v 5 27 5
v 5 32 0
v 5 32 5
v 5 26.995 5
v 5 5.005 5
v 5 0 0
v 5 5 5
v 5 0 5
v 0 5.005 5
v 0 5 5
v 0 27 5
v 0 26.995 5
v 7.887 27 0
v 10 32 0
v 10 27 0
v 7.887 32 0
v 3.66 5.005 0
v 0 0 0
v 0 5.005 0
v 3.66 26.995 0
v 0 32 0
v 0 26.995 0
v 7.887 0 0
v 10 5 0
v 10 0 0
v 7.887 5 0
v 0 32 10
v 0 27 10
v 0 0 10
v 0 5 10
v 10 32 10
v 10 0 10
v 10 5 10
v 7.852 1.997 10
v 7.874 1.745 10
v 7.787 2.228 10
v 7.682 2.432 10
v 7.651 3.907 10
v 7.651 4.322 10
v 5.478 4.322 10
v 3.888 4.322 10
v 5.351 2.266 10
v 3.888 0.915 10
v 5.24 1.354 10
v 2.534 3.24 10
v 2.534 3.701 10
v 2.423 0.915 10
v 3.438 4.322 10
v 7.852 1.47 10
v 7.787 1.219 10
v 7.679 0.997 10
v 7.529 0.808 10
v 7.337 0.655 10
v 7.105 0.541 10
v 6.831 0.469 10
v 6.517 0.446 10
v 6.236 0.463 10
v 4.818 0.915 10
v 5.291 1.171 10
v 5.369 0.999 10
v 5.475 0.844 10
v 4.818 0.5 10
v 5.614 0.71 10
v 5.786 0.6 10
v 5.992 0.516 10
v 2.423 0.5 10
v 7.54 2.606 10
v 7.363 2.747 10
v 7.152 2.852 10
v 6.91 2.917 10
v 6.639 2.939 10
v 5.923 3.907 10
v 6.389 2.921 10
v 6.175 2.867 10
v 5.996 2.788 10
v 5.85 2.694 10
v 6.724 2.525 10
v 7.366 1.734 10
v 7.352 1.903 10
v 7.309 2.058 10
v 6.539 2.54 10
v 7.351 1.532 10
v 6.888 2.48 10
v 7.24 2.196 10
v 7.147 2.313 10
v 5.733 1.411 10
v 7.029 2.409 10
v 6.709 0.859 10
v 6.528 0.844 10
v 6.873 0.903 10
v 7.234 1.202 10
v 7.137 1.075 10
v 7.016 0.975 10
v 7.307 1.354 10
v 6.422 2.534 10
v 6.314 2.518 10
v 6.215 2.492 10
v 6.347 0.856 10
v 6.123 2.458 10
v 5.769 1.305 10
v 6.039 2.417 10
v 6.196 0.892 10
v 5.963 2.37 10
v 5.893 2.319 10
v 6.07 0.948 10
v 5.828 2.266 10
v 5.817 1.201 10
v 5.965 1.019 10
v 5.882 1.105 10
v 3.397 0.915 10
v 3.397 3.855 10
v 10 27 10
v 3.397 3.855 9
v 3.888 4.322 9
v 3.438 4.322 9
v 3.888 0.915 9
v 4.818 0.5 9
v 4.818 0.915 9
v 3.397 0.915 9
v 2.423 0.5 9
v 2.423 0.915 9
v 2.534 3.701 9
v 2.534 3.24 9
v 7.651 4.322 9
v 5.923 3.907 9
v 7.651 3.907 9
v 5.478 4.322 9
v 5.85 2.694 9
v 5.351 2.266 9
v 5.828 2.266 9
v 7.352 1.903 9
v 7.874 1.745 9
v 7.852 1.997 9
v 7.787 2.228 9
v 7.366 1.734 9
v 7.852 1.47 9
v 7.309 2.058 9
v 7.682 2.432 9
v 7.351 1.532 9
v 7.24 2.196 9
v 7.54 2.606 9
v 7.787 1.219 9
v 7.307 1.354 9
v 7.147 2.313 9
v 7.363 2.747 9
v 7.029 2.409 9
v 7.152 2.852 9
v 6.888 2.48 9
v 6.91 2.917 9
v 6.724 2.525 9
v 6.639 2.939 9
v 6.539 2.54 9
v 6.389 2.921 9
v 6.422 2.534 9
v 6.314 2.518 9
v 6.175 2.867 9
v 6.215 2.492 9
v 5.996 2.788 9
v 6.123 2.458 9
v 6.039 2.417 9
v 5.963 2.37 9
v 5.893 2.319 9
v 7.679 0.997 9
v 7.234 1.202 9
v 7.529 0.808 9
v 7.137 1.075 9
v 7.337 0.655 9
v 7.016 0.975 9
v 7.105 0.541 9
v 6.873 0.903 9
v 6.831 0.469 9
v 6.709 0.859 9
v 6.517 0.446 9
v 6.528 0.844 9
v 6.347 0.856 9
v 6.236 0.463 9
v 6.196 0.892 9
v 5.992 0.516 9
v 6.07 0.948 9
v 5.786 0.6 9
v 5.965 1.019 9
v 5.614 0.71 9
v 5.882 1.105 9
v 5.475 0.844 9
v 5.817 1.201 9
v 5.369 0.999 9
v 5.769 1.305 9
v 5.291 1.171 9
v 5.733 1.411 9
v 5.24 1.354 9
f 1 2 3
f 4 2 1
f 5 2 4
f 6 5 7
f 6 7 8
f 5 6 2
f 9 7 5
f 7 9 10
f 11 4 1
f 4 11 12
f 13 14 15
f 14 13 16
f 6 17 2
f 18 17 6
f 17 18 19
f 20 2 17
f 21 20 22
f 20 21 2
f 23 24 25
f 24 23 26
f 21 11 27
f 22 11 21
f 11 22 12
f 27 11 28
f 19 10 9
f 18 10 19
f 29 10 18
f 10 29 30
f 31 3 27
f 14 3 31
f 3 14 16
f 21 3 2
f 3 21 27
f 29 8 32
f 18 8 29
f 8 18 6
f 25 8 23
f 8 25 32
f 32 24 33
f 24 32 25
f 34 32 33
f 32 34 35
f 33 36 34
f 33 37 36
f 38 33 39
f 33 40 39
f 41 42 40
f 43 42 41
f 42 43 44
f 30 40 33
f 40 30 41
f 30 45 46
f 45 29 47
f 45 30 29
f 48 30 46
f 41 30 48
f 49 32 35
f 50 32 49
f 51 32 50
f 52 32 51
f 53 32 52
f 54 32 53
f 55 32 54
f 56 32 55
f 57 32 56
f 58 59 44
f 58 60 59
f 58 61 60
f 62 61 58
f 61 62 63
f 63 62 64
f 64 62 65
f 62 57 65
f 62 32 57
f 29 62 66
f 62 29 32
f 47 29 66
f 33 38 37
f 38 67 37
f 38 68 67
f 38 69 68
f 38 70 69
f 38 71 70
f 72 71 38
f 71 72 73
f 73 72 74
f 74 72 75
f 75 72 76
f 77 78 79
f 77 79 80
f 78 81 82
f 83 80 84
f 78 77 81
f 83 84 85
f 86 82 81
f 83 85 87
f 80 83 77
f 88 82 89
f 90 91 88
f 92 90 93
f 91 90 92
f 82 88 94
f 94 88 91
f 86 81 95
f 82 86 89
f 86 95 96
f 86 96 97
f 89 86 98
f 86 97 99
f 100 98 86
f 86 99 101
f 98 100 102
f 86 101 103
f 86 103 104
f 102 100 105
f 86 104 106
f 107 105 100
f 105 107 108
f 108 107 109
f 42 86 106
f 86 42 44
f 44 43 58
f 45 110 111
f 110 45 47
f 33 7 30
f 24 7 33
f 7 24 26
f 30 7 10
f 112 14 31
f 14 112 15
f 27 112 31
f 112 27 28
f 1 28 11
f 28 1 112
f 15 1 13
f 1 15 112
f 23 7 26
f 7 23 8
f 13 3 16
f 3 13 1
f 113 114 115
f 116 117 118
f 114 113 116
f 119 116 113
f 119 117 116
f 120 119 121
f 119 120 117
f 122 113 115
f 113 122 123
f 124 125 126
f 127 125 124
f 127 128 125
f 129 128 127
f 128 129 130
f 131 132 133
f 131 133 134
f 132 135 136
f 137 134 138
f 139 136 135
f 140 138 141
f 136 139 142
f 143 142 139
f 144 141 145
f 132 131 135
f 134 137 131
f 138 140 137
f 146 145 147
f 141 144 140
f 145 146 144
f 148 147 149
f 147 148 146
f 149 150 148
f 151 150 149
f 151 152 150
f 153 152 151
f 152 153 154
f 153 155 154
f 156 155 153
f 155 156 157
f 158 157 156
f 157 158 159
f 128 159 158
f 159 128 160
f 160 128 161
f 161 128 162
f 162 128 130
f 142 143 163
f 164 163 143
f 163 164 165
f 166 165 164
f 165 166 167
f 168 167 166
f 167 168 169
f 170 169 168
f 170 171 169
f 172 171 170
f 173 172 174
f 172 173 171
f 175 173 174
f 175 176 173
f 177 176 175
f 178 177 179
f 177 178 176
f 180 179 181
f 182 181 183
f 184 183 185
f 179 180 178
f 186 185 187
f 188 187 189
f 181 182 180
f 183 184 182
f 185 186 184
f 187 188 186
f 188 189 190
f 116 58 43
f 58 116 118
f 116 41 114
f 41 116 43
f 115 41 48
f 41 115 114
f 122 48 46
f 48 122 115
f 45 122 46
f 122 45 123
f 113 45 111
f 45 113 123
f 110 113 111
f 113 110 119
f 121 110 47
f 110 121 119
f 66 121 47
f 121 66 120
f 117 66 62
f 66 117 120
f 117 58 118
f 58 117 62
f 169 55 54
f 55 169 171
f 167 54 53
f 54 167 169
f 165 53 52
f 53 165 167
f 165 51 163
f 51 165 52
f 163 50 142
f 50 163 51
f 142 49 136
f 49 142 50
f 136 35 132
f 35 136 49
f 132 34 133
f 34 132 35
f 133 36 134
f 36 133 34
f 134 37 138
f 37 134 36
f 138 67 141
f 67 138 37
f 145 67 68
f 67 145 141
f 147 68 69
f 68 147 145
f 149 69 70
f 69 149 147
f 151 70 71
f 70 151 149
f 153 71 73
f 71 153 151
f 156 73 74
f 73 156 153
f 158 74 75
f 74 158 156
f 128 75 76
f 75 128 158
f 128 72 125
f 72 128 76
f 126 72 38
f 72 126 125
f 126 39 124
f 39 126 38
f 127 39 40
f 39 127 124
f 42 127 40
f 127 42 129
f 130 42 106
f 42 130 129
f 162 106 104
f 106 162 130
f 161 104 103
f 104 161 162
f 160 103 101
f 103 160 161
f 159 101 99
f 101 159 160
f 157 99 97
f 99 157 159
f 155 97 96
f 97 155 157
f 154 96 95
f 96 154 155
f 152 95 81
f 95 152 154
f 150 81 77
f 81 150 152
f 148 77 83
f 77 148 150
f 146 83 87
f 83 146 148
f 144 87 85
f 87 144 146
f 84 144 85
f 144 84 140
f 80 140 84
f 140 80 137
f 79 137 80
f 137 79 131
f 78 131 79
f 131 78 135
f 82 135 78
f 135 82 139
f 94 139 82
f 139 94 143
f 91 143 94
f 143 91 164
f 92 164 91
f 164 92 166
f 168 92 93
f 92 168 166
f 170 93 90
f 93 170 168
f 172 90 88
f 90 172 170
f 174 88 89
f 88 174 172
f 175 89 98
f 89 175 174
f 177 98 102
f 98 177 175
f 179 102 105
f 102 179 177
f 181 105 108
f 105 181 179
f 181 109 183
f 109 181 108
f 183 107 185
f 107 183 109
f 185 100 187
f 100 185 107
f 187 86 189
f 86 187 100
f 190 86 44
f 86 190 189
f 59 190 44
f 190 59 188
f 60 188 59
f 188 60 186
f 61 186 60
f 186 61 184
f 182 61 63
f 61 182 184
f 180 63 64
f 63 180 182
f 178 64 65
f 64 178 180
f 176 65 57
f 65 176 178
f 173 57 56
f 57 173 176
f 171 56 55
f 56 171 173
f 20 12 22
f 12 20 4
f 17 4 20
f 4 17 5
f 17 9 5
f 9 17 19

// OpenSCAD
module k(){
    difference() {
        cube([5,40,6]);
        translate([0,-1,6])
            rotate([0,-30,0])
            translate([0,0,-10])
            cube([15,42,10]);
    };
};
module w(){
    union(){
        cube([5,32,5]);
        translate([0,0,0])cube([10,5,10]);
        translate([0,27,0])cube([10,5,10]);
    };
};
module f(angle){
    difference(){
        union(){
            w();
        };
        translate([2,0.5,9]) linear_extrude(1.1) text(str(angle),4);
        translate([5,-1,-1]) k();
        translate([5,5.005,5])rotate([0,angle,0])translate([-5,0,-20])
            cube([5,21.99,20]);  
    };
};



f(15);
